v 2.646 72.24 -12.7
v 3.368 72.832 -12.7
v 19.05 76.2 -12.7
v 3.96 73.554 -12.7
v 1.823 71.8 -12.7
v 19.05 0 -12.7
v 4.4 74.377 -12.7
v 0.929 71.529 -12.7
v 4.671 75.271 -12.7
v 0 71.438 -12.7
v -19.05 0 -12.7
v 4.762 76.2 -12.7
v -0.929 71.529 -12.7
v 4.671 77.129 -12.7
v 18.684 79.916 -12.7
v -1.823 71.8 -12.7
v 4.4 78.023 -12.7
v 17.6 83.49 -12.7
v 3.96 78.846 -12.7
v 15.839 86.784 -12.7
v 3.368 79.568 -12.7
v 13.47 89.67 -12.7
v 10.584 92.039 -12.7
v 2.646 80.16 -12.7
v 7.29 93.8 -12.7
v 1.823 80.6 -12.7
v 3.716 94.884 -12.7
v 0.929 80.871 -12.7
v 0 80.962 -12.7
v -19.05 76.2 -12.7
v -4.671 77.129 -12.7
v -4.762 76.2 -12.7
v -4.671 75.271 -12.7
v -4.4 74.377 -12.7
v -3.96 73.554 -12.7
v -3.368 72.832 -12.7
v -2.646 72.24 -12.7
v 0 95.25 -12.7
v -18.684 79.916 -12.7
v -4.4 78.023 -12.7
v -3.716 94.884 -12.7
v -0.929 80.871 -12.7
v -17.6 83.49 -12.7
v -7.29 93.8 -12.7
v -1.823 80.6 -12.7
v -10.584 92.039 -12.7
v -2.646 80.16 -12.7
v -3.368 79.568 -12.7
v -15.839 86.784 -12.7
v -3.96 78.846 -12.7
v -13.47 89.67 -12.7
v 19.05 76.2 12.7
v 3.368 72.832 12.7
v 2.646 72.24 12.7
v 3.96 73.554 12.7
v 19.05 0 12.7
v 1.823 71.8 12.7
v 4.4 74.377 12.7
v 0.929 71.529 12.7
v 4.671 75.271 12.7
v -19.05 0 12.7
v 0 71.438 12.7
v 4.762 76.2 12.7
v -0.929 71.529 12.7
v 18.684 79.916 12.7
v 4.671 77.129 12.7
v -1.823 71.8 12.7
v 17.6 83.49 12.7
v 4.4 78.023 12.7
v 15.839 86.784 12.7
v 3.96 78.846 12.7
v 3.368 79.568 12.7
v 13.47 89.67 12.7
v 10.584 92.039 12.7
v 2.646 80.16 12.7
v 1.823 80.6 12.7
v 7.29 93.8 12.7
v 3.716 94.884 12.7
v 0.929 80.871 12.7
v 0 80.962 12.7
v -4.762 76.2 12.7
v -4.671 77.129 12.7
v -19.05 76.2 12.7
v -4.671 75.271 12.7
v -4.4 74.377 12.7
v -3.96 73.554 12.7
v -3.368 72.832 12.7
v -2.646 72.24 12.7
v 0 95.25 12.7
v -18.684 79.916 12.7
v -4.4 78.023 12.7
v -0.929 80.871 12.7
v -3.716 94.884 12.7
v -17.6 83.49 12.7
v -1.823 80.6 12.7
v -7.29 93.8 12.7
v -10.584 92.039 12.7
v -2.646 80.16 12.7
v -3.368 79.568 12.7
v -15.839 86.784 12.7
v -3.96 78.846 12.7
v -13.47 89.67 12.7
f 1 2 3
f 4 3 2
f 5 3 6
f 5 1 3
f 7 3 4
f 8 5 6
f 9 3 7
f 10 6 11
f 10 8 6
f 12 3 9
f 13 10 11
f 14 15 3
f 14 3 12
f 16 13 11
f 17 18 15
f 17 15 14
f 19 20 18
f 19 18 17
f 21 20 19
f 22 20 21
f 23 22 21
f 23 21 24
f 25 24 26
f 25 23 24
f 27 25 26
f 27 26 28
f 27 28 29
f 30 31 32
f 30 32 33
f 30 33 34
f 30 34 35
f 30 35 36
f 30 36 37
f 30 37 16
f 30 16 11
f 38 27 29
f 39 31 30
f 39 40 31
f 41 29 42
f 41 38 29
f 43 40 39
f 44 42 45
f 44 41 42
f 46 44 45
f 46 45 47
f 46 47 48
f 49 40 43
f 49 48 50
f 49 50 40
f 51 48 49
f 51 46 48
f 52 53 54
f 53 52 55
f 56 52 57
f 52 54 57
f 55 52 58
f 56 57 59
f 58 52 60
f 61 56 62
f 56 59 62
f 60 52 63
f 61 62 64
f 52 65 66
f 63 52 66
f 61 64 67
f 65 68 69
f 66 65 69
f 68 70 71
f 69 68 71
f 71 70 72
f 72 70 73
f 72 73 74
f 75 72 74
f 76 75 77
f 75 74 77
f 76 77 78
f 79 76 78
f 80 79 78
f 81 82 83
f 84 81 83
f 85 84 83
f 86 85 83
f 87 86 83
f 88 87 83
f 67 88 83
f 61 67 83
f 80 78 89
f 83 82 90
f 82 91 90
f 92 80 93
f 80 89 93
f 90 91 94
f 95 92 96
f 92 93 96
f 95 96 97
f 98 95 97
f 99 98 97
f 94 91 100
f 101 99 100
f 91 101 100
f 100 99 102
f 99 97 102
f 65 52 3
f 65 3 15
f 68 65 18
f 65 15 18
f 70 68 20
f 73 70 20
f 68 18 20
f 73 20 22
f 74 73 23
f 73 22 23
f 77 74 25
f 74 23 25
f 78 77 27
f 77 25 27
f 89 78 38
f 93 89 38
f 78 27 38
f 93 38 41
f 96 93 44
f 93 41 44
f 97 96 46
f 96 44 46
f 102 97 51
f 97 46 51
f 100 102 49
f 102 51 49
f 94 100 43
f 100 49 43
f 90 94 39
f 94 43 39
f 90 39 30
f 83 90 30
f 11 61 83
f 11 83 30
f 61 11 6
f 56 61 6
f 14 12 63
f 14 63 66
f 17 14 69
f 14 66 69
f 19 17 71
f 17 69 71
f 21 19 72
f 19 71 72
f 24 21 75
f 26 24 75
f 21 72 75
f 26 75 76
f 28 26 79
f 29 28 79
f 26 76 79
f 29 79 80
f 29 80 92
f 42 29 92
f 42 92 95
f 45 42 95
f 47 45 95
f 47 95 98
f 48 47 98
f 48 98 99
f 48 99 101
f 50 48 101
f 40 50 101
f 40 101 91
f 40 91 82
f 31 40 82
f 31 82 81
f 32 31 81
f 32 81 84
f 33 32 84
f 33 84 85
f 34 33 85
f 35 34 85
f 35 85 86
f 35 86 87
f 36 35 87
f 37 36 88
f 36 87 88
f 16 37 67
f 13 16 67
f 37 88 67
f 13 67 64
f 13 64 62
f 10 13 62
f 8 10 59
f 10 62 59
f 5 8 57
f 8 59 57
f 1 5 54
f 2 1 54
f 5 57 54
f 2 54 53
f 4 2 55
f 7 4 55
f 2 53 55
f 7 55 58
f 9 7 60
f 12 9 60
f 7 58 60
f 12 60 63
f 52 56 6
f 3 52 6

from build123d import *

# Parameters (mm, degrees)
SKETCH2_W           = 38.1
SKETCH2_H           = 25.4
BOSS_EXTRUDE1_DEPTH = 76.2
SKETCH3_W           = 19.05
SKETCH3_H           = 25.4
REVOLVE1_ANGLE      = 180
SKETCH4_R           = 4.7625
CUT_EXTRUDE1_DEPTH  = 101.40231571


with BuildPart() as part:
    # Sketch2 → Boss-Extrude1 (new body)
    with BuildSketch(Plane(origin=(0, 0, 0), x_dir=(1, 0, 0), z_dir=(0, 1, 0))):
        Rectangle(SKETCH2_W, SKETCH2_H)
    extrude(amount=BOSS_EXTRUDE1_DEPTH)

    # Sketch3 → Revolve1 (revolve)
    with BuildSketch(Plane(origin=(0, 76.2, 0), x_dir=(1, 0, 0), z_dir=(0, 1, 0))):
        with Locations((9.525, 0)):
            Rectangle(SKETCH3_W, SKETCH3_H)
    revolve(axis=Axis((0, 76.2, -12.7), (0, 0, 1)), revolution_arc=REVOLVE1_ANGLE)

    # Sketch4 → Cut-Extrude1 (cut, through all)
    with BuildSketch(Plane.XY.offset(12.7)):
        with Locations((0, 76.2)):
            Circle(SKETCH4_R)
    extrude(amount=-CUT_EXTRUDE1_DEPTH, mode=Mode.SUBTRACT)


solid = part.part
